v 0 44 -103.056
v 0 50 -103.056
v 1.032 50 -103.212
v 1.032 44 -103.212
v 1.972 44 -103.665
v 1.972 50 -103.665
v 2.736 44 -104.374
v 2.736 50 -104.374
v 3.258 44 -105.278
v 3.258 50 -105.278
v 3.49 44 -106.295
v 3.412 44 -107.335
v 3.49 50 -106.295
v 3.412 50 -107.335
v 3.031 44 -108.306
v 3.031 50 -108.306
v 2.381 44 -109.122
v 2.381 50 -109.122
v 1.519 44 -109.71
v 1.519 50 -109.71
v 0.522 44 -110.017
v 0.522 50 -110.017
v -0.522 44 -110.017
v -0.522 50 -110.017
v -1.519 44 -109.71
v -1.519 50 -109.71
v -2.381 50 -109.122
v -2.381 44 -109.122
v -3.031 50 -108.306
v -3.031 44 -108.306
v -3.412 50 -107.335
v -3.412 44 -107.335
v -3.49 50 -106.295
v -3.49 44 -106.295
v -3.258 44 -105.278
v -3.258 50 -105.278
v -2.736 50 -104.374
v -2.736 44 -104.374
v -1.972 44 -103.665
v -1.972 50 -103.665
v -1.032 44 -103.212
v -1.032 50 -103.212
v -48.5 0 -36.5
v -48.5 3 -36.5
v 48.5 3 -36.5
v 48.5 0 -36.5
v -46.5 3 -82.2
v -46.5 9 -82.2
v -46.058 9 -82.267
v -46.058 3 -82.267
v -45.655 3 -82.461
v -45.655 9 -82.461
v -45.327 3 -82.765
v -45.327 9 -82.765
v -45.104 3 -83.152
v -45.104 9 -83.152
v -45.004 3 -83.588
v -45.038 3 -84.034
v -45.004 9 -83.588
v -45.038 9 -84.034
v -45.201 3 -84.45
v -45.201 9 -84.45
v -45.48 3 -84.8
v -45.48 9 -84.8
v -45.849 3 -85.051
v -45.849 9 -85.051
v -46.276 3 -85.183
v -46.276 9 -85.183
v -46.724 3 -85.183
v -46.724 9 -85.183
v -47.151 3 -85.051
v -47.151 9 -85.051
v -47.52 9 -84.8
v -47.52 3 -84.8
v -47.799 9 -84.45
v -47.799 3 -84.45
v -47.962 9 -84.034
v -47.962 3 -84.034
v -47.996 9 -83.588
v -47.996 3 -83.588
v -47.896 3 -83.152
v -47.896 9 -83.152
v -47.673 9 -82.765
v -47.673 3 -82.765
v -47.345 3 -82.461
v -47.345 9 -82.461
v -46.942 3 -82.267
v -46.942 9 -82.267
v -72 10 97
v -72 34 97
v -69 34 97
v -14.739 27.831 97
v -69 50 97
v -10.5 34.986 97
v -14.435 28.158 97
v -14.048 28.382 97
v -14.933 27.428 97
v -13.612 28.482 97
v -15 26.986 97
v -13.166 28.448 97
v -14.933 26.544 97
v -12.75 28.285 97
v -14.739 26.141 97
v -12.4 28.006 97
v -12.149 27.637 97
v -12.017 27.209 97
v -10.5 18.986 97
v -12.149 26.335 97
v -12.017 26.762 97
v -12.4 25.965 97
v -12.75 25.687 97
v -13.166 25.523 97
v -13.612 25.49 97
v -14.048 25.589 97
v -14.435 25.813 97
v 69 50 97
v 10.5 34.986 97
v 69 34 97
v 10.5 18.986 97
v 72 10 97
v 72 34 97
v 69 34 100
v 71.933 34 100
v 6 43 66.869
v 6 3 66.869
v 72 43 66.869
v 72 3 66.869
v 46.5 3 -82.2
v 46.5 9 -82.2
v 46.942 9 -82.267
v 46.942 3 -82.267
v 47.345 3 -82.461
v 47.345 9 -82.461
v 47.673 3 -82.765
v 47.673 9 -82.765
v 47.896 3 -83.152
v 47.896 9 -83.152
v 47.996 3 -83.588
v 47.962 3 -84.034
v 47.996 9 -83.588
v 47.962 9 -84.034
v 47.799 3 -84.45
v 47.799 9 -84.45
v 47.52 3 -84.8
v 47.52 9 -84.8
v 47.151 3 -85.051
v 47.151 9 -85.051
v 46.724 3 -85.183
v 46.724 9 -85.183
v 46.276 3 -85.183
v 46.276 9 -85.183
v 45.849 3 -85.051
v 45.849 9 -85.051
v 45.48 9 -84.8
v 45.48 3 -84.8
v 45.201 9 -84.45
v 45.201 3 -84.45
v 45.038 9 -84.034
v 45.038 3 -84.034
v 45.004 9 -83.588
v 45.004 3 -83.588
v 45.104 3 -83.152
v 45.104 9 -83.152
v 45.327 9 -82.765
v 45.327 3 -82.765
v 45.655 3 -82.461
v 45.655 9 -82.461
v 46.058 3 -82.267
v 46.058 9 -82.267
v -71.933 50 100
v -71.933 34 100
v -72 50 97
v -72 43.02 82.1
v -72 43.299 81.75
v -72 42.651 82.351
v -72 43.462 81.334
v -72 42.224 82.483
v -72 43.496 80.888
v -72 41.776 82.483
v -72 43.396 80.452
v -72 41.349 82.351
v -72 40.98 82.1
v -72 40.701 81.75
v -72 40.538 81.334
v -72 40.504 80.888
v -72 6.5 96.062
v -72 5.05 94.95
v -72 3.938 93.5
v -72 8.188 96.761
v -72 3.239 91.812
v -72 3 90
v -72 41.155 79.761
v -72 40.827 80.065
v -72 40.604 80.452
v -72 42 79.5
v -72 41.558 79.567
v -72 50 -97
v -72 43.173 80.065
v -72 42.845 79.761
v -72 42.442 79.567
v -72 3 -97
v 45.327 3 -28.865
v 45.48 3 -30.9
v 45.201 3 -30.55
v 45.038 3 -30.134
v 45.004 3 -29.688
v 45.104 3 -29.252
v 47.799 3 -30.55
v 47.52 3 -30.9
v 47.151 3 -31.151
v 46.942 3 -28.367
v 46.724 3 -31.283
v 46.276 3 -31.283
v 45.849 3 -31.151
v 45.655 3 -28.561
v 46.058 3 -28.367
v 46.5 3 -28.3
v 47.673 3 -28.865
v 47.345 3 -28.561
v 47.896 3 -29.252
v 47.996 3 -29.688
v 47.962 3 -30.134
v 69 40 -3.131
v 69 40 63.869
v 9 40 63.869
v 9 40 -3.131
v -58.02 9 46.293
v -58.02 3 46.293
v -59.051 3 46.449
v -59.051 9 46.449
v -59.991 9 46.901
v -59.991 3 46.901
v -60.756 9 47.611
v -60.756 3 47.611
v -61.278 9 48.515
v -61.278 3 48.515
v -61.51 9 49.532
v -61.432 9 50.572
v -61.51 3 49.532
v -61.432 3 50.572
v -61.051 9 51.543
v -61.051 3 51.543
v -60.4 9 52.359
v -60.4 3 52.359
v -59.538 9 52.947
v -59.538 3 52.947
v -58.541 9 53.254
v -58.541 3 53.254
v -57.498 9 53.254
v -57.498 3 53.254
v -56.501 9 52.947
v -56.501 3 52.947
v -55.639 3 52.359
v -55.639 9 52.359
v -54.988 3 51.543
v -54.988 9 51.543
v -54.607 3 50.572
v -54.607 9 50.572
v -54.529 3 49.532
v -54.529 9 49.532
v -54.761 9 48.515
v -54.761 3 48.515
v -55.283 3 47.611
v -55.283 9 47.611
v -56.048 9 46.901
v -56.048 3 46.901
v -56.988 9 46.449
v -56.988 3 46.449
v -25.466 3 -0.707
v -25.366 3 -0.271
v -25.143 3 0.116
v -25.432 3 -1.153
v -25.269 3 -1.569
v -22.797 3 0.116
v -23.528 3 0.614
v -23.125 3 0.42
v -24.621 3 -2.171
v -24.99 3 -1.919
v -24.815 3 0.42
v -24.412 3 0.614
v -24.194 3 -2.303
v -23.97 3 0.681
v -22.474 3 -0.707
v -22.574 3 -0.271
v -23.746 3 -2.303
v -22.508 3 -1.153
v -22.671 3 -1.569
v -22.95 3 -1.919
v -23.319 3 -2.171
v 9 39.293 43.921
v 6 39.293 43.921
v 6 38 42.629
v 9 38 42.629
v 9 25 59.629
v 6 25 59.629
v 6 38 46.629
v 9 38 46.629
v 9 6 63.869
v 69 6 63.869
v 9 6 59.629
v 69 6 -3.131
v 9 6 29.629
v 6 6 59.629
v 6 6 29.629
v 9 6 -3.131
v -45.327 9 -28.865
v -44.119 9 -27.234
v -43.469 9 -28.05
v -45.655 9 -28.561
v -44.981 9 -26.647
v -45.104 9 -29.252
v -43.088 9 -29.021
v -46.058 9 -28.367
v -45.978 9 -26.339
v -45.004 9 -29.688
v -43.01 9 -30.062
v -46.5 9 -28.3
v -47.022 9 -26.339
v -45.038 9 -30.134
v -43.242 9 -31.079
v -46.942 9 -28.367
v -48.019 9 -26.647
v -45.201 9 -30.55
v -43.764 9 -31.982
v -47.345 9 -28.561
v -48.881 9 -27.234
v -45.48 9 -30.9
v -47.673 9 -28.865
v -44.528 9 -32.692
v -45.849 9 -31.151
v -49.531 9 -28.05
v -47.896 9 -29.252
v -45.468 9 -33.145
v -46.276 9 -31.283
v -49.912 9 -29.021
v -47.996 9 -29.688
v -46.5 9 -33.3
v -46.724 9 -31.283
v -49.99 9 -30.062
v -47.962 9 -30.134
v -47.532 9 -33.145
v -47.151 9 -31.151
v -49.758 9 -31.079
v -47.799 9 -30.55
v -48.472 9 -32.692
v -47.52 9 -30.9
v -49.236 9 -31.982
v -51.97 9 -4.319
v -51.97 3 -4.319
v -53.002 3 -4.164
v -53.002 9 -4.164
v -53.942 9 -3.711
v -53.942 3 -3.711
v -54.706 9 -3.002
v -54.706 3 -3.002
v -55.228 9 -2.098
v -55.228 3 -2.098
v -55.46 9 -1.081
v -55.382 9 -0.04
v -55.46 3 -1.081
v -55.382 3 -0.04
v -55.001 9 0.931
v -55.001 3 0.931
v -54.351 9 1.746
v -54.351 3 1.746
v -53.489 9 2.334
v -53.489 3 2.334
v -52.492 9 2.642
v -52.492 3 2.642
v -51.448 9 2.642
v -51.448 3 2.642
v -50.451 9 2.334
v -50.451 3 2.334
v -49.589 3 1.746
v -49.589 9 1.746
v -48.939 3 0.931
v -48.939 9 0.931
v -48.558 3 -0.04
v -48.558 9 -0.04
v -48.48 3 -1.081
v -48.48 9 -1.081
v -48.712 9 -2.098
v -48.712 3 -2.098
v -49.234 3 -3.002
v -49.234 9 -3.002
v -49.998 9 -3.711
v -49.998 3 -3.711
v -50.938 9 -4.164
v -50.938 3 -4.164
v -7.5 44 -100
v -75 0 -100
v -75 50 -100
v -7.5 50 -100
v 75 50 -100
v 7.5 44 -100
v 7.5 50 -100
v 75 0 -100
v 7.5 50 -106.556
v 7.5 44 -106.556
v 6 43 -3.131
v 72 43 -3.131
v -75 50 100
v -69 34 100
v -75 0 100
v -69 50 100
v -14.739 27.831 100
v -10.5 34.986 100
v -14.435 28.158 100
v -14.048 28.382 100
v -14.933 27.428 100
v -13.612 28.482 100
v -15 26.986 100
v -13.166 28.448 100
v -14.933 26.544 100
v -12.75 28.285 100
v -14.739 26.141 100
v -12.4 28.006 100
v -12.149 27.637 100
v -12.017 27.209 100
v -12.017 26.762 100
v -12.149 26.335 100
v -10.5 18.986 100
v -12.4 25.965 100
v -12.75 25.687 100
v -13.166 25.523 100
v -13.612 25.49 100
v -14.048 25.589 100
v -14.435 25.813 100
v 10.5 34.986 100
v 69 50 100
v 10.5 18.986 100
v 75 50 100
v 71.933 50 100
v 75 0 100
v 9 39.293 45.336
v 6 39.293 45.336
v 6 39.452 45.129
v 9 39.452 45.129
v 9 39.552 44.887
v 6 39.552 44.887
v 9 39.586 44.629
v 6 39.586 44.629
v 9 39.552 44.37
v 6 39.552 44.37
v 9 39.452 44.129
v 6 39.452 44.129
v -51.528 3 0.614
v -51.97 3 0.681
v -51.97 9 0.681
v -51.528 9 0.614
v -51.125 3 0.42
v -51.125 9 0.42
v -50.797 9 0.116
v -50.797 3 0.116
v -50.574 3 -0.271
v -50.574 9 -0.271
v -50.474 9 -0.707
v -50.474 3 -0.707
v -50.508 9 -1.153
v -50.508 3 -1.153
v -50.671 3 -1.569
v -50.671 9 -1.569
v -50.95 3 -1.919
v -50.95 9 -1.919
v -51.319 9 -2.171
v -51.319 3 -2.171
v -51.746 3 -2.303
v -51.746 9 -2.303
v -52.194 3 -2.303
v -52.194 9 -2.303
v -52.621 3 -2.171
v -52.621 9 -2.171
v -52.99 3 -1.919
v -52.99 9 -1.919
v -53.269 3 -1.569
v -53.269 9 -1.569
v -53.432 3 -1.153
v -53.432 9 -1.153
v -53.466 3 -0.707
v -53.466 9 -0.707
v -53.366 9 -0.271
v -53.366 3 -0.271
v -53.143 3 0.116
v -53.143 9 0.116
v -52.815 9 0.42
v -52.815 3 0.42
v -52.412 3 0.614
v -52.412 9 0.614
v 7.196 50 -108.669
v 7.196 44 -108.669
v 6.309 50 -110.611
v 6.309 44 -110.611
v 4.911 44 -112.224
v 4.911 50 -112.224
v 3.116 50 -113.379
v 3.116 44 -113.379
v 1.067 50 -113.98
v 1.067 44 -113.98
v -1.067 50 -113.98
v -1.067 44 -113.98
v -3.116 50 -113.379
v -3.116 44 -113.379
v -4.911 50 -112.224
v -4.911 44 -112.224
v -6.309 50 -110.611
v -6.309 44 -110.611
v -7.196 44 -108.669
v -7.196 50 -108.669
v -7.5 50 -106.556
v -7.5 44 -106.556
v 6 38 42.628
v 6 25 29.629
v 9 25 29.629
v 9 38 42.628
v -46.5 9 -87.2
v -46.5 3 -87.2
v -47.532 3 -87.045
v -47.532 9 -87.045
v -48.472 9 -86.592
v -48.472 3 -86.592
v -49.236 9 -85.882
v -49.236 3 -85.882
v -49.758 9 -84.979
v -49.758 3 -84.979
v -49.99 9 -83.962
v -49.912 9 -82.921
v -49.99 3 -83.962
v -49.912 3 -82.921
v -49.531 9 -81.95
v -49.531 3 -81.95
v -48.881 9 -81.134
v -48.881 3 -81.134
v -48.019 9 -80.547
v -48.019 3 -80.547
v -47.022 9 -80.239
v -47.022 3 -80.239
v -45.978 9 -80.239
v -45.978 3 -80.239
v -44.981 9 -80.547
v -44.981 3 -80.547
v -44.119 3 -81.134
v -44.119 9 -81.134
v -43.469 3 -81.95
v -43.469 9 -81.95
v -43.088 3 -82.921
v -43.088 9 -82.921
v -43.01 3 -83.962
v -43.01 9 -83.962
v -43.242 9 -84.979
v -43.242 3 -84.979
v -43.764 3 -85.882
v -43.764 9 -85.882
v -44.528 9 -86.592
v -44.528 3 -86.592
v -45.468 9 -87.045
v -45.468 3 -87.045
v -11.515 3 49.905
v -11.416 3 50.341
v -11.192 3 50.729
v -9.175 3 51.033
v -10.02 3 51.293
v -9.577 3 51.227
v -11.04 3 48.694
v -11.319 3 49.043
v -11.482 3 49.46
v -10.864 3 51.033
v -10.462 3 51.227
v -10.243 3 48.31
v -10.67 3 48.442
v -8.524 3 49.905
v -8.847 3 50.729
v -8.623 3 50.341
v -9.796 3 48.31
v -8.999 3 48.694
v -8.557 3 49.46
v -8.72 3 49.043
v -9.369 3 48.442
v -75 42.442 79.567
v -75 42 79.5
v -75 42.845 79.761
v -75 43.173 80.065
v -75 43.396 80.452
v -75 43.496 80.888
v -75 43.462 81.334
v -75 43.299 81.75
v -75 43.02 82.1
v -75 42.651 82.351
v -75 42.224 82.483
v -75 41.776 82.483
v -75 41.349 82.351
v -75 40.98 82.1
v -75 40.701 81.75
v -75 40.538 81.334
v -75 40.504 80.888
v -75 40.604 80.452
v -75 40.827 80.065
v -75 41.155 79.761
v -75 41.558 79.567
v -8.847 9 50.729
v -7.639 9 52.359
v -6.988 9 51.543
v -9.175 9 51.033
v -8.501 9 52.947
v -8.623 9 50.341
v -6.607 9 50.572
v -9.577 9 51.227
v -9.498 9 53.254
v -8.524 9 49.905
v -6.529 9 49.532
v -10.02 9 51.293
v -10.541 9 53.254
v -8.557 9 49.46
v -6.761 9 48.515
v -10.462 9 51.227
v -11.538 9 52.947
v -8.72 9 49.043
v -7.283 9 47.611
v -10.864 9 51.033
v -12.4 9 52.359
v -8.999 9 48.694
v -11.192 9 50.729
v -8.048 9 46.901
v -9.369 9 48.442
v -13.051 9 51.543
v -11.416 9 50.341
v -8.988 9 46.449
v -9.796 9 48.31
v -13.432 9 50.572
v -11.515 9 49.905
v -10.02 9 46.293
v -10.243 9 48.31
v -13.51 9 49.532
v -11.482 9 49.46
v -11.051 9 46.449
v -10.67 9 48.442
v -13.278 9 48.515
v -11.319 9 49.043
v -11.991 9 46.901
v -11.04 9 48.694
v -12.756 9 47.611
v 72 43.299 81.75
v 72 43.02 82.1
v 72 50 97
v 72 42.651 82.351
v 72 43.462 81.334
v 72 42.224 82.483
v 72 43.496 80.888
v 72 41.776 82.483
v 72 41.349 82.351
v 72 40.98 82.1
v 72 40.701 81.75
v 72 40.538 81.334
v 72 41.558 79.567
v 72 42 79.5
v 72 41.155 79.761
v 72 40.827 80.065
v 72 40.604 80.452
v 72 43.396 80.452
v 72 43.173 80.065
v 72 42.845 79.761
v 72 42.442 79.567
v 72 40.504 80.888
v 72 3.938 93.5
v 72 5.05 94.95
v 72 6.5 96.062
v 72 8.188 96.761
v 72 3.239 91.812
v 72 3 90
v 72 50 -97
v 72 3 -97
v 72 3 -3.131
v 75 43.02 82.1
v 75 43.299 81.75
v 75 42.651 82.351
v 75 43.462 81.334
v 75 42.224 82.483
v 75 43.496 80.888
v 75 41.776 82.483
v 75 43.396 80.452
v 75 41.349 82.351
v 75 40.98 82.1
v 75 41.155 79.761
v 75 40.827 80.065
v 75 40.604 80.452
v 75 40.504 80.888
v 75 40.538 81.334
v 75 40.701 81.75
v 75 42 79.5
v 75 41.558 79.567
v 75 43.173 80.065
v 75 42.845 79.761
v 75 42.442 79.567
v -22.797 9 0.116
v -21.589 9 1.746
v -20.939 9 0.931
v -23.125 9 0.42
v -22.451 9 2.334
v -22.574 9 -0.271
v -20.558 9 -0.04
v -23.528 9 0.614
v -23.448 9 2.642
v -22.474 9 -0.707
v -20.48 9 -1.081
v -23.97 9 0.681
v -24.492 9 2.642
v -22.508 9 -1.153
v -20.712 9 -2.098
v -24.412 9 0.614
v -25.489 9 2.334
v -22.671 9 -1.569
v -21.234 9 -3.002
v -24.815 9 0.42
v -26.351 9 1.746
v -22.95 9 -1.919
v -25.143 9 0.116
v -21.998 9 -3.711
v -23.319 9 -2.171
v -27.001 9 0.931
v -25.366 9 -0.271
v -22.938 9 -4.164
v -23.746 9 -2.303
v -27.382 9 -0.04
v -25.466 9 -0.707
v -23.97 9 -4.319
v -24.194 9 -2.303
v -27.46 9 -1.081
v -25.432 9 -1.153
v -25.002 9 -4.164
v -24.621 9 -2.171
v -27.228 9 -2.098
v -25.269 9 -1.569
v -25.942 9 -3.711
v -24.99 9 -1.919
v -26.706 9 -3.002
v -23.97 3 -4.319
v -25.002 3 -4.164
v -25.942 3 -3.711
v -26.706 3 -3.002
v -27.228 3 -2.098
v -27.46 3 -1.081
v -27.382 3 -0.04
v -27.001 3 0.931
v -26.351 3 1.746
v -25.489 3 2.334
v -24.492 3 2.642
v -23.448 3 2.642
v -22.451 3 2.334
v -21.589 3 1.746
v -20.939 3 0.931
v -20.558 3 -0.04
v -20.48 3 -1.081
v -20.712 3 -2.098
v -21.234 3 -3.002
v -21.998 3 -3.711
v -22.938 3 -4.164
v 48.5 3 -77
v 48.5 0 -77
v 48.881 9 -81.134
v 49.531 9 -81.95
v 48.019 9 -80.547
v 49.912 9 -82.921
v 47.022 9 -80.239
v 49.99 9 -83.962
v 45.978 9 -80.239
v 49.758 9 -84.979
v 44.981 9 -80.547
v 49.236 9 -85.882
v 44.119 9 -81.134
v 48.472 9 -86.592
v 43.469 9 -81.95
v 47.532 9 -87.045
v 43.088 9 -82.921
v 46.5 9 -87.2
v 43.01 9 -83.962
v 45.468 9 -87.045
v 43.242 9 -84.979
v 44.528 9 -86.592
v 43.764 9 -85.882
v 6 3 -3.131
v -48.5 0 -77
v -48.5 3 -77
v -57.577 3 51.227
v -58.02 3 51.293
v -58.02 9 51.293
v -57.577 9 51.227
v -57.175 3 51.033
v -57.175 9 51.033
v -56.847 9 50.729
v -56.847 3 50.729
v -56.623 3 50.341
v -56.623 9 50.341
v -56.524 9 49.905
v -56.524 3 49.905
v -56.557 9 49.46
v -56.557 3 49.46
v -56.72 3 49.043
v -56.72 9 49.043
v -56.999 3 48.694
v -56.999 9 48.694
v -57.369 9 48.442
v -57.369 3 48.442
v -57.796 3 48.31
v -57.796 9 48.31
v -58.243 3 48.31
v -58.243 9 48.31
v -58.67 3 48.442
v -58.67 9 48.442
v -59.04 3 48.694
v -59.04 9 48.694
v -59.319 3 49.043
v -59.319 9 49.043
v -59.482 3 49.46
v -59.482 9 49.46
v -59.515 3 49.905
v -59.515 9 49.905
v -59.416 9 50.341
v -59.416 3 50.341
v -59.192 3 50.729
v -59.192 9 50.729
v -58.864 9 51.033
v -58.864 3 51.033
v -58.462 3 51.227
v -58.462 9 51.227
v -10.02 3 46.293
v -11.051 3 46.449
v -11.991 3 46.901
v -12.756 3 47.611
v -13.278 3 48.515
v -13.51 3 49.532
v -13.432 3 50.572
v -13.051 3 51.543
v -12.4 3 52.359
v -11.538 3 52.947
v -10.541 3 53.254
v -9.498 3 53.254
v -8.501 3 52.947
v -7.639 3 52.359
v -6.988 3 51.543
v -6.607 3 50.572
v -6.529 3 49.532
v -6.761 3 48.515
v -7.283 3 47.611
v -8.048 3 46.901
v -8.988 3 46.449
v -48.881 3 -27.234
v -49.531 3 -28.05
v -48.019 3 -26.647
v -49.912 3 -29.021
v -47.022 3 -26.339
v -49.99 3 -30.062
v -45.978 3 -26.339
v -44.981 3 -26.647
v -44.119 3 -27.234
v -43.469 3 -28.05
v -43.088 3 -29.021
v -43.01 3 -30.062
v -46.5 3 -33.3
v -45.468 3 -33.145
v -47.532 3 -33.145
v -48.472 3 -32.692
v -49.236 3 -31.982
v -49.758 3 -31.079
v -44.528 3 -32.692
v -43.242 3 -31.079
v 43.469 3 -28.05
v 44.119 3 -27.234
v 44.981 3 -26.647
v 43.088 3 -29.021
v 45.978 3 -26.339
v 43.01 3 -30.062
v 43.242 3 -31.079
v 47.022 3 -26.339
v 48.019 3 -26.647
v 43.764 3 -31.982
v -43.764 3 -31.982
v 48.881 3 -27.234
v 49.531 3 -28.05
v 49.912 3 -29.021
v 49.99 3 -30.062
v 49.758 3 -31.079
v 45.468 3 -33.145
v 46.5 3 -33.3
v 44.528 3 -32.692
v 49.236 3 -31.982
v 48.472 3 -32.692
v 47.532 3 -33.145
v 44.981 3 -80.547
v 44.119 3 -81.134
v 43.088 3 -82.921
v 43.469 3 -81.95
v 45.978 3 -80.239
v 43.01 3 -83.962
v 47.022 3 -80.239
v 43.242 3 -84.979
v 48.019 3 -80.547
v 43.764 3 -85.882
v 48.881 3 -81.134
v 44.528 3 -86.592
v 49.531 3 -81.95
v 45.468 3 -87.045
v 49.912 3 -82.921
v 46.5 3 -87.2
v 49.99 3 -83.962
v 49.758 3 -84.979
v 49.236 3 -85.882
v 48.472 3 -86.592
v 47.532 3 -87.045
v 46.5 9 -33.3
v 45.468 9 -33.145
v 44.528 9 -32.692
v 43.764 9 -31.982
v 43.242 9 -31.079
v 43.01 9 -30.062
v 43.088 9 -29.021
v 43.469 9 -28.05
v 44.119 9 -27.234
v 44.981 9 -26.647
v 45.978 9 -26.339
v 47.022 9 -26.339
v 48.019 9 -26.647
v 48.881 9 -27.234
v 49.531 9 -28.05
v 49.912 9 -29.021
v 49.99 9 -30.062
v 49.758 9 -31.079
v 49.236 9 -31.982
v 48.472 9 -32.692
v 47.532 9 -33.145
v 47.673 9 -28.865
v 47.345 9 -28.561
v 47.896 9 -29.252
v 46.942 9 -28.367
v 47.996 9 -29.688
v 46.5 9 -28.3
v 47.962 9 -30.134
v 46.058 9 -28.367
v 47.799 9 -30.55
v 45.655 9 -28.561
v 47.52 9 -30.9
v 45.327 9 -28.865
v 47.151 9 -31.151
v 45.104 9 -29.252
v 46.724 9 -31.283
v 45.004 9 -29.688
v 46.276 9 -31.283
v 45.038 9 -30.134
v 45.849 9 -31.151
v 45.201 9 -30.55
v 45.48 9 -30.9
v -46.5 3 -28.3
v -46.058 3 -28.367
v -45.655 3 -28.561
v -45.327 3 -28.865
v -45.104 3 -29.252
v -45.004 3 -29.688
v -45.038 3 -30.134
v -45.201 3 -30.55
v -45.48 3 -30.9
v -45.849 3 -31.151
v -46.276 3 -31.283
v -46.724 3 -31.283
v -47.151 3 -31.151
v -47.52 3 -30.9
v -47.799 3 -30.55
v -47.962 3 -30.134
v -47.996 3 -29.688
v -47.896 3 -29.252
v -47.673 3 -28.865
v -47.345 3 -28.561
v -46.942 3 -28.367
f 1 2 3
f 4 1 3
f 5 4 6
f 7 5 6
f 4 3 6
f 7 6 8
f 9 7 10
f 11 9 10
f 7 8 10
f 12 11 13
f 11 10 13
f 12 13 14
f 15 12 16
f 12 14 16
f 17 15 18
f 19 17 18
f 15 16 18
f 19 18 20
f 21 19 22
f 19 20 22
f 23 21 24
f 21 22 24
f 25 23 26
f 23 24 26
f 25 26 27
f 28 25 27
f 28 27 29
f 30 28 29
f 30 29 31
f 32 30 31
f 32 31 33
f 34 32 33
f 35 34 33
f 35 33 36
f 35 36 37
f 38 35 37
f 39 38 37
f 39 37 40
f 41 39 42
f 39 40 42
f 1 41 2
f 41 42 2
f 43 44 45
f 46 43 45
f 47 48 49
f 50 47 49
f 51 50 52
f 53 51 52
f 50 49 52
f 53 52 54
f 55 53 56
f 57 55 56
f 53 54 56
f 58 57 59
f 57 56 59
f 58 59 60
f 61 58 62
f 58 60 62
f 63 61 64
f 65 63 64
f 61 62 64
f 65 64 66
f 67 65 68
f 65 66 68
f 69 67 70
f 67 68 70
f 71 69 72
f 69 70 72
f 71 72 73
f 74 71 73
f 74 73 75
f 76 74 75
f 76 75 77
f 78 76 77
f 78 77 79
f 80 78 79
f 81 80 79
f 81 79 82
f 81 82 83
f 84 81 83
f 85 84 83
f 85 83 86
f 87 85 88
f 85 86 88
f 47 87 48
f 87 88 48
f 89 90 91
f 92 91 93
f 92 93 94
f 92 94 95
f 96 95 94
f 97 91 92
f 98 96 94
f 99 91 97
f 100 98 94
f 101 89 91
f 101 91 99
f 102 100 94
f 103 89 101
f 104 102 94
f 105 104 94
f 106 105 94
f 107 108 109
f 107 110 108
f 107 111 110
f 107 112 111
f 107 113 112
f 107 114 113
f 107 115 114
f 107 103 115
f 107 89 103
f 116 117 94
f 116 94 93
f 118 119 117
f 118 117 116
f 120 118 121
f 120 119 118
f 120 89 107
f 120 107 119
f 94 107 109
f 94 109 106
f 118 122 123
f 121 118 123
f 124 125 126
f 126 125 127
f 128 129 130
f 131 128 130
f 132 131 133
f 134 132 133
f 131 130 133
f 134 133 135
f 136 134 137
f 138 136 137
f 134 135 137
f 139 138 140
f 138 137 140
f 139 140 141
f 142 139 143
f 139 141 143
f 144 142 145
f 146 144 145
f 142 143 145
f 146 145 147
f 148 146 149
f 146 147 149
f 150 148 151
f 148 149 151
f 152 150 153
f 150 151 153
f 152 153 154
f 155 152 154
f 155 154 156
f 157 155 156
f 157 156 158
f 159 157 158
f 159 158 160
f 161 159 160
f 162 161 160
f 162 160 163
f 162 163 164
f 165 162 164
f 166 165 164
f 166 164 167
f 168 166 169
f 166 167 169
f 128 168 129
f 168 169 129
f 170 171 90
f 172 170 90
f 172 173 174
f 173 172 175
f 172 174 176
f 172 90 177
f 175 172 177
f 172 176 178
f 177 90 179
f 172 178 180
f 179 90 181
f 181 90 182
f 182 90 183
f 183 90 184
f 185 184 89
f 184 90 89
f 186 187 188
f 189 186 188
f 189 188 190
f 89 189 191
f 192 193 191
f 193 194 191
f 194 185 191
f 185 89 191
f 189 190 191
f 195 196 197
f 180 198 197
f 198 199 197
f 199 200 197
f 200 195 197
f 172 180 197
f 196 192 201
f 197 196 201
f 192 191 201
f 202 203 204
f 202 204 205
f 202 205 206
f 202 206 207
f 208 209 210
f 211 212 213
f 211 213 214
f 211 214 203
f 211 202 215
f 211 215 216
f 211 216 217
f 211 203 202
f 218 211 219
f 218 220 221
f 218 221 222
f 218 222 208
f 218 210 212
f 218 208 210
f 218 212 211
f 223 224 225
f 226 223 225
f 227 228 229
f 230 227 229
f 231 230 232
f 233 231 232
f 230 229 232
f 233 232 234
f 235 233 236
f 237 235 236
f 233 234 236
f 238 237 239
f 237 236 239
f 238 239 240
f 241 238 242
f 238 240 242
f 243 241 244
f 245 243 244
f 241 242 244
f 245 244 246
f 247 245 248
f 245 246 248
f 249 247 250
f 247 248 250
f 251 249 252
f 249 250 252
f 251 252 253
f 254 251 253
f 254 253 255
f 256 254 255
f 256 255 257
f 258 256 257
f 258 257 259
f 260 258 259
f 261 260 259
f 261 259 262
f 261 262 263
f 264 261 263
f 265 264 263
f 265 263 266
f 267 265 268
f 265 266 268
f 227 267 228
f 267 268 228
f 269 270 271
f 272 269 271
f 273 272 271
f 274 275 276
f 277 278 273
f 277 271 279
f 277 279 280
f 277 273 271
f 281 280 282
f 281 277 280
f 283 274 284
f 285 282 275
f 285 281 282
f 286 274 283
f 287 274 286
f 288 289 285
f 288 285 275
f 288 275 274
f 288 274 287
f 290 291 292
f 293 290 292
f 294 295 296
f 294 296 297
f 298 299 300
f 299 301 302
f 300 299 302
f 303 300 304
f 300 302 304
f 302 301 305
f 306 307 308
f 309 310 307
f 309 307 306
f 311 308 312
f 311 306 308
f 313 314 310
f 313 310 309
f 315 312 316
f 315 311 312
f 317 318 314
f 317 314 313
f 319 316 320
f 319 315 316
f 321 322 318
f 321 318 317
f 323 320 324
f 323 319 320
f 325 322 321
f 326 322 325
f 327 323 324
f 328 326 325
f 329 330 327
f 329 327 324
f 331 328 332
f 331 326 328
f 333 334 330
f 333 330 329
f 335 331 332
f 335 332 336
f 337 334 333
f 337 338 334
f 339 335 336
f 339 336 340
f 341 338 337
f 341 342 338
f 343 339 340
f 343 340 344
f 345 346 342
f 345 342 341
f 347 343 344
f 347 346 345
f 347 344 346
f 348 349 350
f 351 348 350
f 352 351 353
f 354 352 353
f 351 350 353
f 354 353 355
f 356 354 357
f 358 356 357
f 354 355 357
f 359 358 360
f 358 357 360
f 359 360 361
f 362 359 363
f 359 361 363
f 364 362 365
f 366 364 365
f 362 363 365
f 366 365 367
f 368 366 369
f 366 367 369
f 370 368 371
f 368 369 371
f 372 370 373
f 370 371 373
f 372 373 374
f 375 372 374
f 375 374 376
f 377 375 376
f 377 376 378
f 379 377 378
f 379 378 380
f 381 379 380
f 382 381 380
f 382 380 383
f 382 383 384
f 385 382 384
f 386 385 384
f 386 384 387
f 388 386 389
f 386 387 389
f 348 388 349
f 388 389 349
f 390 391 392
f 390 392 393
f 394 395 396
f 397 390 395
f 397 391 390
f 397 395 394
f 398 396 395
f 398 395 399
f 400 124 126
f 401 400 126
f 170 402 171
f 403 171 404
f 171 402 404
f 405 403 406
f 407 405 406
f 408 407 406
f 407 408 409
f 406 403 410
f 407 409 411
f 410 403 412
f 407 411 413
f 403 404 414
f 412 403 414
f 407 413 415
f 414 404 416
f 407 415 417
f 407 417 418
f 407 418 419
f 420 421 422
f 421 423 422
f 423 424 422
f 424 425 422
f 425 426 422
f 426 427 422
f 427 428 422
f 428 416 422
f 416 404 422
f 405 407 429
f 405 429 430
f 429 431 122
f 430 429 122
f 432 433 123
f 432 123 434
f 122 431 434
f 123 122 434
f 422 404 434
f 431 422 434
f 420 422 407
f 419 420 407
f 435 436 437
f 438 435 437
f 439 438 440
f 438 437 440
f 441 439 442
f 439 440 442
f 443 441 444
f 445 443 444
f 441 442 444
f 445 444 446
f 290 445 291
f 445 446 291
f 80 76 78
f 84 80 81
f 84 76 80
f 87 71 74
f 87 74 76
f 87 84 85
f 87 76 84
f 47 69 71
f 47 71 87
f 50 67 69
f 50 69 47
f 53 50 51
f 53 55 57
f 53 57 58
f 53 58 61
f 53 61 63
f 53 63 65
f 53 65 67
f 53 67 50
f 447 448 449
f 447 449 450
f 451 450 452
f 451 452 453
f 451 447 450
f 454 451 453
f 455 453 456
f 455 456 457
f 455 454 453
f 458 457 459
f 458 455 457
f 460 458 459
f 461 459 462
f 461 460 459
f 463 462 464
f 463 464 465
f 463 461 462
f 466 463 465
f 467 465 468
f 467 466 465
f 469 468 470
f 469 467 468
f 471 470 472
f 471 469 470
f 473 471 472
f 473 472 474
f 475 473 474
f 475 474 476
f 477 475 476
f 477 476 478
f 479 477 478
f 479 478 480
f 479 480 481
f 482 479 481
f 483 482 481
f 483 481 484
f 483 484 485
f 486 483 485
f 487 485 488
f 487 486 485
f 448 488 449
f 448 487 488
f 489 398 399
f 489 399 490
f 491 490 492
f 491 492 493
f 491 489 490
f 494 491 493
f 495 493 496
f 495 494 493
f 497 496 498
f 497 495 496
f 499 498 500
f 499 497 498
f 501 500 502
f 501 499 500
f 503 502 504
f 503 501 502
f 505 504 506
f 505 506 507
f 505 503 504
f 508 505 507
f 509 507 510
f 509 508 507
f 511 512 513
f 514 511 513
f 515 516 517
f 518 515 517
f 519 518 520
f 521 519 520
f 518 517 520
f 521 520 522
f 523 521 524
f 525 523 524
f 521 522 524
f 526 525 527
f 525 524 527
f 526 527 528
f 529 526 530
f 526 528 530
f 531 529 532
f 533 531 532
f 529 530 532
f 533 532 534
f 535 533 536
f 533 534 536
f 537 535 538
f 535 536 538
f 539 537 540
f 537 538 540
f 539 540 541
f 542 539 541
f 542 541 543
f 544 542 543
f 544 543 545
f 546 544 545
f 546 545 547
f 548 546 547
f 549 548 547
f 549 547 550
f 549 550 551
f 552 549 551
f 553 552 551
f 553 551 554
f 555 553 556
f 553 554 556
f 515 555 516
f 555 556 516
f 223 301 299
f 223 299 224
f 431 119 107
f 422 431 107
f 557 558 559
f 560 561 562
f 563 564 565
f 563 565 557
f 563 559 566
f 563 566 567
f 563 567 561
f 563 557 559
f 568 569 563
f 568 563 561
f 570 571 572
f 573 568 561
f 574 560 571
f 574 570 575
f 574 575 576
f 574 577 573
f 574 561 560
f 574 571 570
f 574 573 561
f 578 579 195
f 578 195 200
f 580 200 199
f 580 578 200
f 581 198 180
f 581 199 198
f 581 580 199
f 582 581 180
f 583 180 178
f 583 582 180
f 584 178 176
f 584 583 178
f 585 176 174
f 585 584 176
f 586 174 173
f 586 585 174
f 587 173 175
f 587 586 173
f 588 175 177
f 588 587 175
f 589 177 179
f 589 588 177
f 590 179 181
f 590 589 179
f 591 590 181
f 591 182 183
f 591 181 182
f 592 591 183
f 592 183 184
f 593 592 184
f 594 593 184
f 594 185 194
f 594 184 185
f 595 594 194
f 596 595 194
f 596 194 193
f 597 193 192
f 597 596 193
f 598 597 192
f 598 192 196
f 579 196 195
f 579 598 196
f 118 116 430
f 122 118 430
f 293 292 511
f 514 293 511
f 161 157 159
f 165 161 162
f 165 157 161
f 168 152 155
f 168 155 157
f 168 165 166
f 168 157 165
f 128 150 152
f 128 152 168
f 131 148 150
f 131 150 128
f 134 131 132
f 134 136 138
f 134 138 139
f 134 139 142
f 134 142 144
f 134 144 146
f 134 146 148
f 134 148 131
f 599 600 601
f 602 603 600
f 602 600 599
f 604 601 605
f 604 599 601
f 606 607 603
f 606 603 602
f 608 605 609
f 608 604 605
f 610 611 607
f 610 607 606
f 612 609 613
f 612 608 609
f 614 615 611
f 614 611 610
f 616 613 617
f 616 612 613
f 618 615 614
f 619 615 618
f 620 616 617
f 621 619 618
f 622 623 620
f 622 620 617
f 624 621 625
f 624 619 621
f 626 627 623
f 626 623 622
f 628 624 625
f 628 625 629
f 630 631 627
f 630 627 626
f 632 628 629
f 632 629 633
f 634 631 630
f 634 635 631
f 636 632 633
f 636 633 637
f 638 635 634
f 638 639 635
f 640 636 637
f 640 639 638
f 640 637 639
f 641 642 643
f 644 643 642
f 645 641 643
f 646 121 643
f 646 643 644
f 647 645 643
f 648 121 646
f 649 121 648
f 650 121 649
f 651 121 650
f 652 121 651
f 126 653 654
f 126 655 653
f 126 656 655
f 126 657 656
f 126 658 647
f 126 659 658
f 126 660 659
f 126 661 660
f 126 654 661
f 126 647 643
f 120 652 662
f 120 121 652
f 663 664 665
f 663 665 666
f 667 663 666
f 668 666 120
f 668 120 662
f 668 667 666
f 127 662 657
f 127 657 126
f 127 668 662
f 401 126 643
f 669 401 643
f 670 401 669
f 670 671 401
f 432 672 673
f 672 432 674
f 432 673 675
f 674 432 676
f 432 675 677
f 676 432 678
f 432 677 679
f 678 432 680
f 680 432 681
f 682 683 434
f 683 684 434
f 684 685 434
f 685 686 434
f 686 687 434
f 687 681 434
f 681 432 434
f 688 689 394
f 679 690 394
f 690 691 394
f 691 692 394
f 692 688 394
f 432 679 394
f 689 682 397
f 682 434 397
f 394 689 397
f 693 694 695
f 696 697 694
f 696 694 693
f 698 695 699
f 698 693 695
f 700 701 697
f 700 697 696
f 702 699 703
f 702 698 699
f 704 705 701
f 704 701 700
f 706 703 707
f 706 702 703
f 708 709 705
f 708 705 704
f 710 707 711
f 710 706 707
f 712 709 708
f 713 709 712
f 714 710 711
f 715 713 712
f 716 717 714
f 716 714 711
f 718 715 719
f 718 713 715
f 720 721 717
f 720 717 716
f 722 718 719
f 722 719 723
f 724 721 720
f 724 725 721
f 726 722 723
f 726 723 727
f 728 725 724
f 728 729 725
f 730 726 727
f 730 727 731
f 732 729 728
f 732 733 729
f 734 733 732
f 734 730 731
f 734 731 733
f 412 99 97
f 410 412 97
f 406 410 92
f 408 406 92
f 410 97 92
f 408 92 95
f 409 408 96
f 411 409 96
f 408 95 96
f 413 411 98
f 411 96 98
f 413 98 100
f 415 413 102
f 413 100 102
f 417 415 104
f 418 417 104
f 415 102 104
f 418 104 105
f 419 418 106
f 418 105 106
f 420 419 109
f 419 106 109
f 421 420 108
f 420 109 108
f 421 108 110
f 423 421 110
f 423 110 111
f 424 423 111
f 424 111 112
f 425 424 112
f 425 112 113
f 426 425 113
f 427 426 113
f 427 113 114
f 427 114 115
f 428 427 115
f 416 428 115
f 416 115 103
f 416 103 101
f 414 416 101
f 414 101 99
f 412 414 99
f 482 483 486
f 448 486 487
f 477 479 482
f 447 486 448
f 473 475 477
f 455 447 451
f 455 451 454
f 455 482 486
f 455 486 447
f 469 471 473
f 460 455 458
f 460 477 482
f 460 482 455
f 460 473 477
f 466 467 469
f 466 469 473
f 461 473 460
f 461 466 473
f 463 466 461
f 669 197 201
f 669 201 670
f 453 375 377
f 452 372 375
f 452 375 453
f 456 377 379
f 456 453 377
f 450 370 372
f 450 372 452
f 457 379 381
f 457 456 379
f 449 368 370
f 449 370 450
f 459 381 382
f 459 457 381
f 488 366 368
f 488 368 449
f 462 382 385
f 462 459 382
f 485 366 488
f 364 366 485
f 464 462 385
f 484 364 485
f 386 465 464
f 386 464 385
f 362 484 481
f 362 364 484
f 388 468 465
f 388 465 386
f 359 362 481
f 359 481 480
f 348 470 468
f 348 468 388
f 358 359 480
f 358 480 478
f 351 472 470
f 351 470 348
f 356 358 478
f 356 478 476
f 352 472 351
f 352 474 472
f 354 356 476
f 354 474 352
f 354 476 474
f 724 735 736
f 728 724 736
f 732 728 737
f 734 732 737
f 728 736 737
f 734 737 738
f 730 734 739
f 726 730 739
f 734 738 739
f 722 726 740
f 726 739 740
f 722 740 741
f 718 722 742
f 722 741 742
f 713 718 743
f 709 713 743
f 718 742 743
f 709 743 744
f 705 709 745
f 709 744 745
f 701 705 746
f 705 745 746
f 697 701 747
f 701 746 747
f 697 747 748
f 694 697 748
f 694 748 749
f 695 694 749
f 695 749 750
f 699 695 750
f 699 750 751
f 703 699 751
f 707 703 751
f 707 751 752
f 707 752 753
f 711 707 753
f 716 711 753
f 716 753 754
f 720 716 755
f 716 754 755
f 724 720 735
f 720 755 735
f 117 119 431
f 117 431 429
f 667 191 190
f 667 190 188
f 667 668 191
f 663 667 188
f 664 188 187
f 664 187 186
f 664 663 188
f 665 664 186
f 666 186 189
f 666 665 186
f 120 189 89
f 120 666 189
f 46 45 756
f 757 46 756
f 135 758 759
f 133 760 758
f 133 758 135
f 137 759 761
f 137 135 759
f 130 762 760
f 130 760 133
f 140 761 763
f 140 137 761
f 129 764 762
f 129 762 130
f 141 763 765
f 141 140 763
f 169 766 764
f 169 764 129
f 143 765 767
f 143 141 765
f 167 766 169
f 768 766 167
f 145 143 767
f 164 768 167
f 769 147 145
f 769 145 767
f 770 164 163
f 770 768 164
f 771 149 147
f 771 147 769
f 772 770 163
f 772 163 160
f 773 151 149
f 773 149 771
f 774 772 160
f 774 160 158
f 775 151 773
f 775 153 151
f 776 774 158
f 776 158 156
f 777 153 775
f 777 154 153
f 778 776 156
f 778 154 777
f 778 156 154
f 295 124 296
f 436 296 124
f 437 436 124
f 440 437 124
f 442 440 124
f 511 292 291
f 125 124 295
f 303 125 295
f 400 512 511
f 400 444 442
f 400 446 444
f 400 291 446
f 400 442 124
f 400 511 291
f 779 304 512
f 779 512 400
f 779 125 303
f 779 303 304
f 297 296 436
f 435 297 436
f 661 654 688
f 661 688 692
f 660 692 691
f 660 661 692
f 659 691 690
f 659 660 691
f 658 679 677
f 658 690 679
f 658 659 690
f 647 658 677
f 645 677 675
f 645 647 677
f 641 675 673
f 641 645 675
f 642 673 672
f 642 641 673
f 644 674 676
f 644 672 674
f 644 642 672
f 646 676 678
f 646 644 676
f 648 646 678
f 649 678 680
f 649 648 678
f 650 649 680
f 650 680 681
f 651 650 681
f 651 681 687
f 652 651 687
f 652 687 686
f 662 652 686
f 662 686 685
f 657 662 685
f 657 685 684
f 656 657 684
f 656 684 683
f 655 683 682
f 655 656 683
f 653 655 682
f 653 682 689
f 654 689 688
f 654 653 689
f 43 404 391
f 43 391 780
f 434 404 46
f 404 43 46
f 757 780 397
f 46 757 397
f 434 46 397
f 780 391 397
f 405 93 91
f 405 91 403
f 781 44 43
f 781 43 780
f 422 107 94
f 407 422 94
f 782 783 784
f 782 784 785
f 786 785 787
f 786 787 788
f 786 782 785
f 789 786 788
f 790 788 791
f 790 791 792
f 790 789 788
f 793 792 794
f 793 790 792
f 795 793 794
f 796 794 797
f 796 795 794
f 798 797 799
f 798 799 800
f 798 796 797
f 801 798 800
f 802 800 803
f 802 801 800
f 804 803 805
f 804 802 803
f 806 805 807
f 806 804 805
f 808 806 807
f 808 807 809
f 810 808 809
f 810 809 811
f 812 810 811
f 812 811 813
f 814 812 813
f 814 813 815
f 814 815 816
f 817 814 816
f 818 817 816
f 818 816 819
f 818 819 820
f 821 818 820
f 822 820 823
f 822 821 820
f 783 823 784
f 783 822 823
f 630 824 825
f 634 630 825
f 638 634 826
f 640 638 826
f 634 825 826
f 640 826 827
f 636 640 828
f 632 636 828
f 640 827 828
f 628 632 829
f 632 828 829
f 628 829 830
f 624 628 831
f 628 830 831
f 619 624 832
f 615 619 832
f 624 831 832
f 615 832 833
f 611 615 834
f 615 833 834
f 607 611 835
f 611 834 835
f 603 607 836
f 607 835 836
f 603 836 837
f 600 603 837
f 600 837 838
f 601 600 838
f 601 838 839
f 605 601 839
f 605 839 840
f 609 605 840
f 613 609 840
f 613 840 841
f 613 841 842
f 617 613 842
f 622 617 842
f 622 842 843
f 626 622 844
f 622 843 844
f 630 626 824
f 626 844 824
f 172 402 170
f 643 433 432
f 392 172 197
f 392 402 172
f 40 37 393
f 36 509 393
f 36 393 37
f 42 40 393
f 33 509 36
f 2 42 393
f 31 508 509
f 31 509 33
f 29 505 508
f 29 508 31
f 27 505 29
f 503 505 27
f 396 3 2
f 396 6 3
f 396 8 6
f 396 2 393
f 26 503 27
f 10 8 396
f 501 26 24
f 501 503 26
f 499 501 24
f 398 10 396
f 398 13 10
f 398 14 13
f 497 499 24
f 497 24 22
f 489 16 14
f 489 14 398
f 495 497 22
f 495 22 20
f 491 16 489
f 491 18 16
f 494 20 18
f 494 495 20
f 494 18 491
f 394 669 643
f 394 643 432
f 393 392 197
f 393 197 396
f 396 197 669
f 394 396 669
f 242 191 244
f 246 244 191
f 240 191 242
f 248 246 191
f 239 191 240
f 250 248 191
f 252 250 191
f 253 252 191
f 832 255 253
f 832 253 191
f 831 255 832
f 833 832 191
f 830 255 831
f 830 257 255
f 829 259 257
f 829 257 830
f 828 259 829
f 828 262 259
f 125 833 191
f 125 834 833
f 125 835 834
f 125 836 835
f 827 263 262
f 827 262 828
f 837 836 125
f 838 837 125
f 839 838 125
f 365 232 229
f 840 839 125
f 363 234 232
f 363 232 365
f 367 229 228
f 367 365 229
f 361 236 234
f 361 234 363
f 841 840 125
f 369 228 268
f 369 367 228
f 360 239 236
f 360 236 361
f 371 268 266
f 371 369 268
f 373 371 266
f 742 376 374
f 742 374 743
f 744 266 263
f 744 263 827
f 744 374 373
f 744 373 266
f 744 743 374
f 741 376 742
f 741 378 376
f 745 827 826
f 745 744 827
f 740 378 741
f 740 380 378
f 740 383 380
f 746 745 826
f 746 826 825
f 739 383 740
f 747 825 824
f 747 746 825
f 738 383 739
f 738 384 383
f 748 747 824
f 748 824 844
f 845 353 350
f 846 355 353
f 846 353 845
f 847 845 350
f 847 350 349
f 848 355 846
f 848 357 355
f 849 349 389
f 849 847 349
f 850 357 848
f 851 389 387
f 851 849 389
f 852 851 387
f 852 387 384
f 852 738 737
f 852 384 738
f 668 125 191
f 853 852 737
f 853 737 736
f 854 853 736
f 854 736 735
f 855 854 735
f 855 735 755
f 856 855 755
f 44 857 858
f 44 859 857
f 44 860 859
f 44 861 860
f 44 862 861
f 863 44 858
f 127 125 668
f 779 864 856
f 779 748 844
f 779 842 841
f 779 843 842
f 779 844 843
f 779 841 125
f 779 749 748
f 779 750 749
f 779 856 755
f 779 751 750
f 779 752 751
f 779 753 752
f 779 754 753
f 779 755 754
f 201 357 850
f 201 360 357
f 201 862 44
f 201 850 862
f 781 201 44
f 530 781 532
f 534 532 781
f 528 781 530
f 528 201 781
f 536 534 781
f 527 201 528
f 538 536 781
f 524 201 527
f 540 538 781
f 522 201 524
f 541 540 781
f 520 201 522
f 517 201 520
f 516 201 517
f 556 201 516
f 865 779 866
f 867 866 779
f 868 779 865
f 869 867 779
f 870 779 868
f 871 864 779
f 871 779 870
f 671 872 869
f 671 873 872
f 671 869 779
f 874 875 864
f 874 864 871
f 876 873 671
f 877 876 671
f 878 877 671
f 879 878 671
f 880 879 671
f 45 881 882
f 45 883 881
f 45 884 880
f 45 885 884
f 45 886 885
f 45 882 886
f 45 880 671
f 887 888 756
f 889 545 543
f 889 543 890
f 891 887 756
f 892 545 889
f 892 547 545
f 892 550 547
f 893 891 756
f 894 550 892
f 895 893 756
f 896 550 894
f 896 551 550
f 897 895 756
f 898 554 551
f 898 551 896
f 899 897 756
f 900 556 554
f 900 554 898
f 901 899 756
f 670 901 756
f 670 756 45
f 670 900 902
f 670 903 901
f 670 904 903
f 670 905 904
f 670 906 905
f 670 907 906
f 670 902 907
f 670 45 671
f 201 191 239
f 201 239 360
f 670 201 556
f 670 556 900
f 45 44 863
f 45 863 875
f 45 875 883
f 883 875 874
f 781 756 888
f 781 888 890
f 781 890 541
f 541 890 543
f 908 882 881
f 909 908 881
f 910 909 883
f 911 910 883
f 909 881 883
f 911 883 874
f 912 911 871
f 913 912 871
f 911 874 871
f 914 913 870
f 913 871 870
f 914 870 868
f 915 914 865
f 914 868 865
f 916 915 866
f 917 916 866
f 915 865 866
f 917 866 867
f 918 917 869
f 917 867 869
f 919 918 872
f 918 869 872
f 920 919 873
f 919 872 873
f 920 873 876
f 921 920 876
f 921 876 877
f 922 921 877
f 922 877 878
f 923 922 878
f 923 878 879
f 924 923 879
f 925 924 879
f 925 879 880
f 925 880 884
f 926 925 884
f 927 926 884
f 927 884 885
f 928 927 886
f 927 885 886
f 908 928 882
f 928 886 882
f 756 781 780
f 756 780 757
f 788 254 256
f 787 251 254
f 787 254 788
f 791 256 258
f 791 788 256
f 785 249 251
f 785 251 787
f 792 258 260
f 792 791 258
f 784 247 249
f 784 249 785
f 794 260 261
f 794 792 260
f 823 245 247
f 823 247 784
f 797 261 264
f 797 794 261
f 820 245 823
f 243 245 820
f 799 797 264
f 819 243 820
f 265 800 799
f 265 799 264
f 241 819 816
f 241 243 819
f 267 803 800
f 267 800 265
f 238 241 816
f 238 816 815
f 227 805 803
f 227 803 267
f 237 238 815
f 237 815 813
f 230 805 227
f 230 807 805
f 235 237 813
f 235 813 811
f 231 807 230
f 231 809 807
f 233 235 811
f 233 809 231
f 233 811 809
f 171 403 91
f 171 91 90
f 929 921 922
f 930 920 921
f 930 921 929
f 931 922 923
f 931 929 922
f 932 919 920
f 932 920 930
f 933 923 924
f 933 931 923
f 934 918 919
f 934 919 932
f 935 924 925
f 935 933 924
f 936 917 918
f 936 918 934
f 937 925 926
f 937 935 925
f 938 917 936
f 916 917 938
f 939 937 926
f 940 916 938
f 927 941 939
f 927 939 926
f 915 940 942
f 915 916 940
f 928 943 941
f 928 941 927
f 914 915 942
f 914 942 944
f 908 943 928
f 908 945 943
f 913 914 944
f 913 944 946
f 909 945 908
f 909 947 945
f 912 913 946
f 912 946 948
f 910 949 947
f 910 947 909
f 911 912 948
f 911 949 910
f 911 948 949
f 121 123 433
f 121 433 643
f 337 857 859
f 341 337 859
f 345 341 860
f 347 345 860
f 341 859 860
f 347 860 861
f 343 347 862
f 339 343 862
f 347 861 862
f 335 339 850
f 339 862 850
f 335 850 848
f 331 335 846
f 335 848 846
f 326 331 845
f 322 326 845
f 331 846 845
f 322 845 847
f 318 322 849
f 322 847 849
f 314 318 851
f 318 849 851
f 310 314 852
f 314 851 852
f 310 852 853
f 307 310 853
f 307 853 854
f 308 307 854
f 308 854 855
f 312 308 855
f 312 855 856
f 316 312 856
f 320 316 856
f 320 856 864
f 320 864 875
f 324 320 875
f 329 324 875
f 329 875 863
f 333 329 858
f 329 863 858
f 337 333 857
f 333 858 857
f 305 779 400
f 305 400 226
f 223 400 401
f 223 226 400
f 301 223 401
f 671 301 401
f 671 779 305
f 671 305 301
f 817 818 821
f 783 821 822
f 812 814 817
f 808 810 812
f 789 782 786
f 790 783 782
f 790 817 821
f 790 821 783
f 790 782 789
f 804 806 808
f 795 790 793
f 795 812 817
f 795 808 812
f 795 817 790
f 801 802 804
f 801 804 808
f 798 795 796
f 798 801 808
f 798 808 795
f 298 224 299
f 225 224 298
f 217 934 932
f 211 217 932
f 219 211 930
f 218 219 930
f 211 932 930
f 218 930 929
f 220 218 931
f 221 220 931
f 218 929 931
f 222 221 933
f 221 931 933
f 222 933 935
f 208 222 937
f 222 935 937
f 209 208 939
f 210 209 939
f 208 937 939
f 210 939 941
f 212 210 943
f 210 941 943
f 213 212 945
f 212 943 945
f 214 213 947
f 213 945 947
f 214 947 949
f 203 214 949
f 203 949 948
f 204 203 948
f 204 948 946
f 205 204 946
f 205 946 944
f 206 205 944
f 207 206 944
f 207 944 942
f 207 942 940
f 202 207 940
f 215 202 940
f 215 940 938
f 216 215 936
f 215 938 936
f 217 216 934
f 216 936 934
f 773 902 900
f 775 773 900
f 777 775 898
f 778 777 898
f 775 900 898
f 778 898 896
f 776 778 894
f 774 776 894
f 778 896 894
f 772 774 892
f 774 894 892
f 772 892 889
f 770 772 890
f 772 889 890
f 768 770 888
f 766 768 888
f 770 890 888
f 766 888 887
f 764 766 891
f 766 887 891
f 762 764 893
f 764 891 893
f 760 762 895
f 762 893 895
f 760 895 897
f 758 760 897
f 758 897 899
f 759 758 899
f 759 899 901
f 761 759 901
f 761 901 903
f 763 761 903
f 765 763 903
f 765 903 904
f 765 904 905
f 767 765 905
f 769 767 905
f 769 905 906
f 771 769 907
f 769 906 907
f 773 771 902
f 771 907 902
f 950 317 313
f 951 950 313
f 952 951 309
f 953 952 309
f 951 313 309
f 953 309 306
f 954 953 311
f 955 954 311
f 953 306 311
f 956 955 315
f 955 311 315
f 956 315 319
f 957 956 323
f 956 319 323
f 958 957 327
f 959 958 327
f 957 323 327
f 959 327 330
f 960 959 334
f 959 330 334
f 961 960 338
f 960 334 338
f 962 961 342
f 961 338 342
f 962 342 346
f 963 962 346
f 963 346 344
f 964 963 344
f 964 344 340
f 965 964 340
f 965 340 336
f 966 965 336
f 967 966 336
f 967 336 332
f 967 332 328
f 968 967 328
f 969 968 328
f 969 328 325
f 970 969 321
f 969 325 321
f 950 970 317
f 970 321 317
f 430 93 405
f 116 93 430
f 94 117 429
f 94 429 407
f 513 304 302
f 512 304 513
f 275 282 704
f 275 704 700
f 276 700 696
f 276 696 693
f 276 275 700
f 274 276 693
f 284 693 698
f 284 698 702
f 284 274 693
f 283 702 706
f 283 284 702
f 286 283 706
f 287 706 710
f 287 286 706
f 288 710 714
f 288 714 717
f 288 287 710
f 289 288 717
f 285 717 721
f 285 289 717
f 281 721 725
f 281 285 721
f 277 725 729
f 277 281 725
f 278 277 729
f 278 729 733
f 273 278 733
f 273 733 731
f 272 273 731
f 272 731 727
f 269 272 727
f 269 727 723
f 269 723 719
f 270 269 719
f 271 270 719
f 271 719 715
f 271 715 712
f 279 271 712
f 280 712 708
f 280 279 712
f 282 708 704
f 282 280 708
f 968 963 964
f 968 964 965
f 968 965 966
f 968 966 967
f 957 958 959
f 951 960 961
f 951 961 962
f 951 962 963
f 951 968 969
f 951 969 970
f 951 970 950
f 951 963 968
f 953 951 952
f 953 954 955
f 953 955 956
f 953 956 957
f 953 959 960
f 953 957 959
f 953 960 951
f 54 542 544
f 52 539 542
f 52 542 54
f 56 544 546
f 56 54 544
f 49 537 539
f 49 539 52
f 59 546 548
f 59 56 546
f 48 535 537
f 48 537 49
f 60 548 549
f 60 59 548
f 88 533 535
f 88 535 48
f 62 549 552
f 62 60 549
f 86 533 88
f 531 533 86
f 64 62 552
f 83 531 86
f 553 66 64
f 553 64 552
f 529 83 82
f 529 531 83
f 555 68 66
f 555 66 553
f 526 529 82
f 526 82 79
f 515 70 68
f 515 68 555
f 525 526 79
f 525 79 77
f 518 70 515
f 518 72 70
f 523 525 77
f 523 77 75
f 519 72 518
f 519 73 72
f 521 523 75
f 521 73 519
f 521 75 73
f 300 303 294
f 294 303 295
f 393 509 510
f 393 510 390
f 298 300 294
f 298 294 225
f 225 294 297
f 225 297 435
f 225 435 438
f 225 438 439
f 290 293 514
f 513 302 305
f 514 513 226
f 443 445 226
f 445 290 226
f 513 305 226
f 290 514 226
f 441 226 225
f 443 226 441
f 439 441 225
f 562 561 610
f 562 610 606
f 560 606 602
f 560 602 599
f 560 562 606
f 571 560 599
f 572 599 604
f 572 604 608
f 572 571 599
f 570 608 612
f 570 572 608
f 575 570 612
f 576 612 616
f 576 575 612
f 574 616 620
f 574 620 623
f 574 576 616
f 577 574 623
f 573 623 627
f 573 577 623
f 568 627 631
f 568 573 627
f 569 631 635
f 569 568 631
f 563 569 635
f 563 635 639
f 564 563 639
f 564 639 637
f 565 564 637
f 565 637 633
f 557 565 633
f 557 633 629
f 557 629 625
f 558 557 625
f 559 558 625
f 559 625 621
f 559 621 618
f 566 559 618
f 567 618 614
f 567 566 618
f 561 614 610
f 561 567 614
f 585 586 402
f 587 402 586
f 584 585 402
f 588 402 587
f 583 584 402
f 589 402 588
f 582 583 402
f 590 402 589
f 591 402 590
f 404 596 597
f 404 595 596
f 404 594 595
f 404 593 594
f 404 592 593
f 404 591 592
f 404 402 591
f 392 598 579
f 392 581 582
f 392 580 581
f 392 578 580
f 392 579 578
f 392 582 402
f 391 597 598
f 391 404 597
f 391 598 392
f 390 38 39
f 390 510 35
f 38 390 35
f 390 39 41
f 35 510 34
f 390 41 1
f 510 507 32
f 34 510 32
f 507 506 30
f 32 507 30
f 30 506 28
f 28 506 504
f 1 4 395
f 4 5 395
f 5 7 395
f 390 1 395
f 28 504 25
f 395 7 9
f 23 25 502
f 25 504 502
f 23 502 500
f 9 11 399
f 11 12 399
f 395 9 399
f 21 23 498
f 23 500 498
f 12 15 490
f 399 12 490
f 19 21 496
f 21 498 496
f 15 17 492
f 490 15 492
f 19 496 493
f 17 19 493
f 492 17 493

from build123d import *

# Parameters (mm, degrees)
SKETCH1_W               = 150
SKETCH1_H               = 200
BOSS_EXTRUDE1_DEPTH     = 50
SHELL1_T                = -3
SKETCH2_W               = 97
SKETCH2_H               = 40.5
CUT_EXTRUDE1_DEPTH      = 40
SKETCH4_R               = 3.5
BOSS_EXTRUDE2_DEPTH     = 6
SKETCH5_R               = 1.5
CUT_EXTRUDE2_DEPTH      = 6
CUT_EXTRUDE3_DEPTH      = 16
CUT_EXTRUDE4_DEPTH      = 185.686220385
CUT_EXTRUDE4_DEPTH_BACK = 185.686220385
SKETCH9_R               = 1.5
SKETCH11_R              = 1.5
SKETCH11_W              = 21
SKETCH11_H              = 16
CUT_EXTRUDE5_DEPTH      = 217.642562762
SKETCH13_R              = 3.5
BOSS_EXTRUDE5_DEPTH     = 6
FILLET1_R               = 7
SKETCH15_R              = 3.5
SKETCH15_R_2            = 1.5
BOSS_EXTRUDE6_DEPTH     = 6
SKETCH17_W              = 66
SKETCH17_H              = 70
BOSS_EXTRUDE7_DEPTH     = 40
SKETCH18_W              = 60
SKETCH18_H              = 34
CUT_EXTRUDE6_DEPTH      = 67
SKETCH19_W              = 30
SKETCH19_H              = 34
CUT_EXTRUDE7_DEPTH      = 3
CHAMFER1_SIZE           = 15
FILLET2_START           = 6
FILLET2_DEPTH           = 3


with BuildPart() as part:
    # Sketch1 → Boss-Extrude1 (new body)
    with BuildSketch(Plane(origin=(0, 0, 0), x_dir=(1, 0, 0), z_dir=(0, 1, 0))):
        Rectangle(SKETCH1_W, SKETCH1_H)
    extrude(amount=BOSS_EXTRUDE1_DEPTH)

    # Shell1
    shell1_openings = [part.faces().sort_by_distance(p)[0] for p in [
        (0, 50, 0),
    ]]
    offset(amount=SHELL1_T, openings=shell1_openings, kind=Kind.INTERSECTION)

    # Sketch2 → Cut-Extrude1 (cut)
    with BuildSketch(Plane(origin=(0, 3, 0), x_dir=(1, 0, 0), z_dir=(0, 1, 0))):
        with Locations((0, 56.75)):
            Rectangle(SKETCH2_W, SKETCH2_H)
    extrude(amount=-CUT_EXTRUDE1_DEPTH, mode=Mode.SUBTRACT)

    # Sketch4 → Boss-Extrude2 (add)
    with BuildSketch(Plane(origin=(0, 3, 0), x_dir=(1, 0, 0), z_dir=(0, 1, 0))):
        with Locations(Location((46.5, 83.7, 0), (0, 0, 90))):
            Circle(SKETCH4_R)
        with Locations(Location((-46.5, 83.7, 0), (0, 0, 90))):
            Circle(SKETCH4_R)
        with Locations(Location((46.5, 29.8, 0), (0, 0, 90))):
            Circle(SKETCH4_R)
        with Locations(Location((-46.5, 29.8, 0), (0, 0, 90))):
            Circle(SKETCH4_R)
    extrude(amount=BOSS_EXTRUDE2_DEPTH)

    # Sketch5 → Cut-Extrude2 (cut)
    with BuildSketch(Plane(origin=(0, 9, 0), x_dir=(1, 0, 0), z_dir=(0, 1, 0))):
        with Locations(Location((-46.5, 83.7, 0), (0, 0, 270))):
            Circle(SKETCH5_R)
        with Locations(Location((46.5, 83.7, 0), (0, 0, 270))):
            Circle(SKETCH5_R)
        with Locations(Location((-46.5, 29.8, 0), (0, 0, 270))):
            Circle(SKETCH5_R)
        with Locations(Location((46.5, 29.8, 0), (0, 0, 270))):
            Circle(SKETCH5_R)
    extrude(amount=-CUT_EXTRUDE2_DEPTH, mode=Mode.SUBTRACT)

    # Sketch7 → Cut-Extrude3 (cut)
    with BuildSketch(Plane(origin=(0, 50, 0), x_dir=(1, 0, 0), z_dir=(0, 1, 0))):
        Polygon((-72, -97), (-72, -80.924133637), (-69, -80.924133637), (-69, -231.933334159), align=None)
        Polygon((69, -231.933334159), (72, -97), (72, -80.924133637), (69, -80.924133637), align=None)
    extrude(amount=-CUT_EXTRUDE3_DEPTH, mode=Mode.SUBTRACT)

    # Sketch9 → Cut-Extrude4 (cut, two sides: drawn at the far end of the back side and taken through both)
    with BuildSketch(Plane(origin=(-72, 0, 0), x_dir=(0, 0, -1), z_dir=(1, 0, 0)).offset(-CUT_EXTRUDE4_DEPTH_BACK)):
        with Locations((-81, 42)):
            Circle(SKETCH9_R)
    extrude(amount=CUT_EXTRUDE4_DEPTH + CUT_EXTRUDE4_DEPTH_BACK, mode=Mode.SUBTRACT)

    # Sketch11 → Cut-Extrude5 (cut, through all)
    with BuildSketch(Plane(origin=(0, 0, 97), x_dir=(-1, 0, 0), z_dir=(0, 0, -1))):
        with Locations((13.5, 26.985710618)):
            Circle(SKETCH11_R)
        with Locations((0, 26.985710618)):
            Rectangle(SKETCH11_W, SKETCH11_H)
    extrude(amount=-CUT_EXTRUDE5_DEPTH, mode=Mode.SUBTRACT)

    # Sketch13 → Boss-Extrude5 (add)
    with BuildSketch(Plane(origin=(0, 50, 0), x_dir=(1, 0, 0), z_dir=(0, 1, 0))):
        with BuildLine():
            Line((-7.5, 106.556339799), (-7.5, 97))
            Line((-7.5, 97), (7.5, 97))
            Line((7.5, 97), (7.5, 106.556339799))
            ThreePointArc((7.5, 106.556339799), (0, 114.056339799), (-7.5, 106.556339799))
        make_face()
        with Locations(Location((0, 106.556339799, 0), (0, 0, 270))):
            Circle(SKETCH13_R, mode=Mode.SUBTRACT)
    extrude(amount=-BOSS_EXTRUDE5_DEPTH)

    # Fillet1
    fillet1_edges = [part.edges().sort_by_distance(p)[0] for p in [
        (0, 3, 97),
    ]]
    fillet(fillet1_edges, radius=FILLET1_R)

    # Sketch15 → Boss-Extrude6 (add)
    # profile 1 of 4: a face of its own
    with BuildSketch(Plane(origin=(0, 3, 0), x_dir=(1, 0, 0), z_dir=(0, 1, 0))):
        with Locations(Location((-58.019508849, -49.793289196, 0), (0, 0, 90))):
            Circle(SKETCH15_R)
        with Locations(Location((-58.019508849, -49.793289196, 0), (0, 0, 270))):
            Circle(SKETCH15_R_2, mode=Mode.SUBTRACT)
    # profile 2 of 4: a face of its own
    with BuildSketch(Plane(origin=(0, 3, 0), x_dir=(1, 0, 0), z_dir=(0, 1, 0))):
        with Locations(Location((-10.019508849, -49.793289196, 0), (0, 0, 90))):
            Circle(SKETCH15_R)
        with Locations(Location((-10.019508849, -49.793289196, 0), (0, 0, 270))):
            Circle(SKETCH15_R_2, mode=Mode.SUBTRACT)
    # profile 3 of 4: a face of its own
    with BuildSketch(Plane(origin=(0, 3, 0), x_dir=(1, 0, 0), z_dir=(0, 1, 0))):
        with Locations(Location((-23.970029682, 0.819287981, 0), (0, 0, 90))):
            Circle(SKETCH15_R)
        with Locations(Location((-23.970029682, 0.819287981, 0), (0, 0, 270))):
            Circle(SKETCH15_R_2, mode=Mode.SUBTRACT)
    # profile 4 of 4: a face of its own
    with BuildSketch(Plane(origin=(0, 3, 0), x_dir=(1, 0, 0), z_dir=(0, 1, 0))):
        with Locations(Location((-51.970029682, 0.819287981, 0), (0, 0, 90))):
            Circle(SKETCH15_R)
        with Locations(Location((-51.970029682, 0.819287981, 0), (0, 0, 270))):
            Circle(SKETCH15_R_2, mode=Mode.SUBTRACT)
    extrude(amount=BOSS_EXTRUDE6_DEPTH)

    # Sketch17 → Boss-Extrude7 (add)
    with BuildSketch(Plane(origin=(0, 3, 0), x_dir=(1, 0, 0), z_dir=(0, 1, 0))):
        with Locations((39, -31.868850241)):
            Rectangle(SKETCH17_W, SKETCH17_H)
    extrude(amount=BOSS_EXTRUDE7_DEPTH)

    # Sketch18 → Cut-Extrude6 (cut)
    with BuildSketch(Plane(origin=(0, 0, -3.131149759), x_dir=(-1, 0, 0), z_dir=(0, 0, -1))):
        with Locations((-39, 23)):
            Rectangle(SKETCH18_W, SKETCH18_H)
    extrude(amount=-CUT_EXTRUDE6_DEPTH, mode=Mode.SUBTRACT)

    # Sketch19 → Cut-Extrude7 (cut)
    with BuildSketch(Plane.ZY.offset(-6)):
        with Locations((44.62857151, 23)):
            Rectangle(SKETCH19_W, SKETCH19_H)
    extrude(amount=-CUT_EXTRUDE7_DEPTH, mode=Mode.SUBTRACT)

    # Chamfer1
    chamfer1_edges = [part.edges().sort_by_distance(p)[0] for p in [
        (7.5, 40, 59.62857151),
        (7.5, 40, 29.62857151),
    ]]
    chamfer(chamfer1_edges, length=CHAMFER1_SIZE - 0.0001)  # a hair under: the kernel refuses the full size


with BuildPart() as fillet2_tool:
    # Fillet2: read off the stored shape, not the designer's step
    # Fillet2 outline → Fillet2 (new body)
    with BuildSketch(Plane.YZ.offset(FILLET2_START)):
        with BuildLine():
            Line((38, 46.62857151), (39.292893219, 45.335678291))
            ThreePointArc((39.292893219, 45.335678291), (39.585786438, 44.628571509), (39.292893219, 43.921464728))
            Line((39.292893219, 43.921464728), (38, 42.628571509))
            Line((38, 42.628571509), (38, 42))
            Line((38, 42), (41, 42))
            Line((41, 42), (41, 47))
            Line((41, 47), (38, 47))
            Line((38, 47), (38, 46.62857151))
        make_face()
    extrude(amount=FILLET2_DEPTH)


with BuildPart() as part_1:
    add(part.part)


with BuildPart() as part_2:
    # Fillet2: joined with fillet2_tool
    add(part_1.part.fuse(fillet2_tool.part, tol=0.00001))


solid = part_2.part
